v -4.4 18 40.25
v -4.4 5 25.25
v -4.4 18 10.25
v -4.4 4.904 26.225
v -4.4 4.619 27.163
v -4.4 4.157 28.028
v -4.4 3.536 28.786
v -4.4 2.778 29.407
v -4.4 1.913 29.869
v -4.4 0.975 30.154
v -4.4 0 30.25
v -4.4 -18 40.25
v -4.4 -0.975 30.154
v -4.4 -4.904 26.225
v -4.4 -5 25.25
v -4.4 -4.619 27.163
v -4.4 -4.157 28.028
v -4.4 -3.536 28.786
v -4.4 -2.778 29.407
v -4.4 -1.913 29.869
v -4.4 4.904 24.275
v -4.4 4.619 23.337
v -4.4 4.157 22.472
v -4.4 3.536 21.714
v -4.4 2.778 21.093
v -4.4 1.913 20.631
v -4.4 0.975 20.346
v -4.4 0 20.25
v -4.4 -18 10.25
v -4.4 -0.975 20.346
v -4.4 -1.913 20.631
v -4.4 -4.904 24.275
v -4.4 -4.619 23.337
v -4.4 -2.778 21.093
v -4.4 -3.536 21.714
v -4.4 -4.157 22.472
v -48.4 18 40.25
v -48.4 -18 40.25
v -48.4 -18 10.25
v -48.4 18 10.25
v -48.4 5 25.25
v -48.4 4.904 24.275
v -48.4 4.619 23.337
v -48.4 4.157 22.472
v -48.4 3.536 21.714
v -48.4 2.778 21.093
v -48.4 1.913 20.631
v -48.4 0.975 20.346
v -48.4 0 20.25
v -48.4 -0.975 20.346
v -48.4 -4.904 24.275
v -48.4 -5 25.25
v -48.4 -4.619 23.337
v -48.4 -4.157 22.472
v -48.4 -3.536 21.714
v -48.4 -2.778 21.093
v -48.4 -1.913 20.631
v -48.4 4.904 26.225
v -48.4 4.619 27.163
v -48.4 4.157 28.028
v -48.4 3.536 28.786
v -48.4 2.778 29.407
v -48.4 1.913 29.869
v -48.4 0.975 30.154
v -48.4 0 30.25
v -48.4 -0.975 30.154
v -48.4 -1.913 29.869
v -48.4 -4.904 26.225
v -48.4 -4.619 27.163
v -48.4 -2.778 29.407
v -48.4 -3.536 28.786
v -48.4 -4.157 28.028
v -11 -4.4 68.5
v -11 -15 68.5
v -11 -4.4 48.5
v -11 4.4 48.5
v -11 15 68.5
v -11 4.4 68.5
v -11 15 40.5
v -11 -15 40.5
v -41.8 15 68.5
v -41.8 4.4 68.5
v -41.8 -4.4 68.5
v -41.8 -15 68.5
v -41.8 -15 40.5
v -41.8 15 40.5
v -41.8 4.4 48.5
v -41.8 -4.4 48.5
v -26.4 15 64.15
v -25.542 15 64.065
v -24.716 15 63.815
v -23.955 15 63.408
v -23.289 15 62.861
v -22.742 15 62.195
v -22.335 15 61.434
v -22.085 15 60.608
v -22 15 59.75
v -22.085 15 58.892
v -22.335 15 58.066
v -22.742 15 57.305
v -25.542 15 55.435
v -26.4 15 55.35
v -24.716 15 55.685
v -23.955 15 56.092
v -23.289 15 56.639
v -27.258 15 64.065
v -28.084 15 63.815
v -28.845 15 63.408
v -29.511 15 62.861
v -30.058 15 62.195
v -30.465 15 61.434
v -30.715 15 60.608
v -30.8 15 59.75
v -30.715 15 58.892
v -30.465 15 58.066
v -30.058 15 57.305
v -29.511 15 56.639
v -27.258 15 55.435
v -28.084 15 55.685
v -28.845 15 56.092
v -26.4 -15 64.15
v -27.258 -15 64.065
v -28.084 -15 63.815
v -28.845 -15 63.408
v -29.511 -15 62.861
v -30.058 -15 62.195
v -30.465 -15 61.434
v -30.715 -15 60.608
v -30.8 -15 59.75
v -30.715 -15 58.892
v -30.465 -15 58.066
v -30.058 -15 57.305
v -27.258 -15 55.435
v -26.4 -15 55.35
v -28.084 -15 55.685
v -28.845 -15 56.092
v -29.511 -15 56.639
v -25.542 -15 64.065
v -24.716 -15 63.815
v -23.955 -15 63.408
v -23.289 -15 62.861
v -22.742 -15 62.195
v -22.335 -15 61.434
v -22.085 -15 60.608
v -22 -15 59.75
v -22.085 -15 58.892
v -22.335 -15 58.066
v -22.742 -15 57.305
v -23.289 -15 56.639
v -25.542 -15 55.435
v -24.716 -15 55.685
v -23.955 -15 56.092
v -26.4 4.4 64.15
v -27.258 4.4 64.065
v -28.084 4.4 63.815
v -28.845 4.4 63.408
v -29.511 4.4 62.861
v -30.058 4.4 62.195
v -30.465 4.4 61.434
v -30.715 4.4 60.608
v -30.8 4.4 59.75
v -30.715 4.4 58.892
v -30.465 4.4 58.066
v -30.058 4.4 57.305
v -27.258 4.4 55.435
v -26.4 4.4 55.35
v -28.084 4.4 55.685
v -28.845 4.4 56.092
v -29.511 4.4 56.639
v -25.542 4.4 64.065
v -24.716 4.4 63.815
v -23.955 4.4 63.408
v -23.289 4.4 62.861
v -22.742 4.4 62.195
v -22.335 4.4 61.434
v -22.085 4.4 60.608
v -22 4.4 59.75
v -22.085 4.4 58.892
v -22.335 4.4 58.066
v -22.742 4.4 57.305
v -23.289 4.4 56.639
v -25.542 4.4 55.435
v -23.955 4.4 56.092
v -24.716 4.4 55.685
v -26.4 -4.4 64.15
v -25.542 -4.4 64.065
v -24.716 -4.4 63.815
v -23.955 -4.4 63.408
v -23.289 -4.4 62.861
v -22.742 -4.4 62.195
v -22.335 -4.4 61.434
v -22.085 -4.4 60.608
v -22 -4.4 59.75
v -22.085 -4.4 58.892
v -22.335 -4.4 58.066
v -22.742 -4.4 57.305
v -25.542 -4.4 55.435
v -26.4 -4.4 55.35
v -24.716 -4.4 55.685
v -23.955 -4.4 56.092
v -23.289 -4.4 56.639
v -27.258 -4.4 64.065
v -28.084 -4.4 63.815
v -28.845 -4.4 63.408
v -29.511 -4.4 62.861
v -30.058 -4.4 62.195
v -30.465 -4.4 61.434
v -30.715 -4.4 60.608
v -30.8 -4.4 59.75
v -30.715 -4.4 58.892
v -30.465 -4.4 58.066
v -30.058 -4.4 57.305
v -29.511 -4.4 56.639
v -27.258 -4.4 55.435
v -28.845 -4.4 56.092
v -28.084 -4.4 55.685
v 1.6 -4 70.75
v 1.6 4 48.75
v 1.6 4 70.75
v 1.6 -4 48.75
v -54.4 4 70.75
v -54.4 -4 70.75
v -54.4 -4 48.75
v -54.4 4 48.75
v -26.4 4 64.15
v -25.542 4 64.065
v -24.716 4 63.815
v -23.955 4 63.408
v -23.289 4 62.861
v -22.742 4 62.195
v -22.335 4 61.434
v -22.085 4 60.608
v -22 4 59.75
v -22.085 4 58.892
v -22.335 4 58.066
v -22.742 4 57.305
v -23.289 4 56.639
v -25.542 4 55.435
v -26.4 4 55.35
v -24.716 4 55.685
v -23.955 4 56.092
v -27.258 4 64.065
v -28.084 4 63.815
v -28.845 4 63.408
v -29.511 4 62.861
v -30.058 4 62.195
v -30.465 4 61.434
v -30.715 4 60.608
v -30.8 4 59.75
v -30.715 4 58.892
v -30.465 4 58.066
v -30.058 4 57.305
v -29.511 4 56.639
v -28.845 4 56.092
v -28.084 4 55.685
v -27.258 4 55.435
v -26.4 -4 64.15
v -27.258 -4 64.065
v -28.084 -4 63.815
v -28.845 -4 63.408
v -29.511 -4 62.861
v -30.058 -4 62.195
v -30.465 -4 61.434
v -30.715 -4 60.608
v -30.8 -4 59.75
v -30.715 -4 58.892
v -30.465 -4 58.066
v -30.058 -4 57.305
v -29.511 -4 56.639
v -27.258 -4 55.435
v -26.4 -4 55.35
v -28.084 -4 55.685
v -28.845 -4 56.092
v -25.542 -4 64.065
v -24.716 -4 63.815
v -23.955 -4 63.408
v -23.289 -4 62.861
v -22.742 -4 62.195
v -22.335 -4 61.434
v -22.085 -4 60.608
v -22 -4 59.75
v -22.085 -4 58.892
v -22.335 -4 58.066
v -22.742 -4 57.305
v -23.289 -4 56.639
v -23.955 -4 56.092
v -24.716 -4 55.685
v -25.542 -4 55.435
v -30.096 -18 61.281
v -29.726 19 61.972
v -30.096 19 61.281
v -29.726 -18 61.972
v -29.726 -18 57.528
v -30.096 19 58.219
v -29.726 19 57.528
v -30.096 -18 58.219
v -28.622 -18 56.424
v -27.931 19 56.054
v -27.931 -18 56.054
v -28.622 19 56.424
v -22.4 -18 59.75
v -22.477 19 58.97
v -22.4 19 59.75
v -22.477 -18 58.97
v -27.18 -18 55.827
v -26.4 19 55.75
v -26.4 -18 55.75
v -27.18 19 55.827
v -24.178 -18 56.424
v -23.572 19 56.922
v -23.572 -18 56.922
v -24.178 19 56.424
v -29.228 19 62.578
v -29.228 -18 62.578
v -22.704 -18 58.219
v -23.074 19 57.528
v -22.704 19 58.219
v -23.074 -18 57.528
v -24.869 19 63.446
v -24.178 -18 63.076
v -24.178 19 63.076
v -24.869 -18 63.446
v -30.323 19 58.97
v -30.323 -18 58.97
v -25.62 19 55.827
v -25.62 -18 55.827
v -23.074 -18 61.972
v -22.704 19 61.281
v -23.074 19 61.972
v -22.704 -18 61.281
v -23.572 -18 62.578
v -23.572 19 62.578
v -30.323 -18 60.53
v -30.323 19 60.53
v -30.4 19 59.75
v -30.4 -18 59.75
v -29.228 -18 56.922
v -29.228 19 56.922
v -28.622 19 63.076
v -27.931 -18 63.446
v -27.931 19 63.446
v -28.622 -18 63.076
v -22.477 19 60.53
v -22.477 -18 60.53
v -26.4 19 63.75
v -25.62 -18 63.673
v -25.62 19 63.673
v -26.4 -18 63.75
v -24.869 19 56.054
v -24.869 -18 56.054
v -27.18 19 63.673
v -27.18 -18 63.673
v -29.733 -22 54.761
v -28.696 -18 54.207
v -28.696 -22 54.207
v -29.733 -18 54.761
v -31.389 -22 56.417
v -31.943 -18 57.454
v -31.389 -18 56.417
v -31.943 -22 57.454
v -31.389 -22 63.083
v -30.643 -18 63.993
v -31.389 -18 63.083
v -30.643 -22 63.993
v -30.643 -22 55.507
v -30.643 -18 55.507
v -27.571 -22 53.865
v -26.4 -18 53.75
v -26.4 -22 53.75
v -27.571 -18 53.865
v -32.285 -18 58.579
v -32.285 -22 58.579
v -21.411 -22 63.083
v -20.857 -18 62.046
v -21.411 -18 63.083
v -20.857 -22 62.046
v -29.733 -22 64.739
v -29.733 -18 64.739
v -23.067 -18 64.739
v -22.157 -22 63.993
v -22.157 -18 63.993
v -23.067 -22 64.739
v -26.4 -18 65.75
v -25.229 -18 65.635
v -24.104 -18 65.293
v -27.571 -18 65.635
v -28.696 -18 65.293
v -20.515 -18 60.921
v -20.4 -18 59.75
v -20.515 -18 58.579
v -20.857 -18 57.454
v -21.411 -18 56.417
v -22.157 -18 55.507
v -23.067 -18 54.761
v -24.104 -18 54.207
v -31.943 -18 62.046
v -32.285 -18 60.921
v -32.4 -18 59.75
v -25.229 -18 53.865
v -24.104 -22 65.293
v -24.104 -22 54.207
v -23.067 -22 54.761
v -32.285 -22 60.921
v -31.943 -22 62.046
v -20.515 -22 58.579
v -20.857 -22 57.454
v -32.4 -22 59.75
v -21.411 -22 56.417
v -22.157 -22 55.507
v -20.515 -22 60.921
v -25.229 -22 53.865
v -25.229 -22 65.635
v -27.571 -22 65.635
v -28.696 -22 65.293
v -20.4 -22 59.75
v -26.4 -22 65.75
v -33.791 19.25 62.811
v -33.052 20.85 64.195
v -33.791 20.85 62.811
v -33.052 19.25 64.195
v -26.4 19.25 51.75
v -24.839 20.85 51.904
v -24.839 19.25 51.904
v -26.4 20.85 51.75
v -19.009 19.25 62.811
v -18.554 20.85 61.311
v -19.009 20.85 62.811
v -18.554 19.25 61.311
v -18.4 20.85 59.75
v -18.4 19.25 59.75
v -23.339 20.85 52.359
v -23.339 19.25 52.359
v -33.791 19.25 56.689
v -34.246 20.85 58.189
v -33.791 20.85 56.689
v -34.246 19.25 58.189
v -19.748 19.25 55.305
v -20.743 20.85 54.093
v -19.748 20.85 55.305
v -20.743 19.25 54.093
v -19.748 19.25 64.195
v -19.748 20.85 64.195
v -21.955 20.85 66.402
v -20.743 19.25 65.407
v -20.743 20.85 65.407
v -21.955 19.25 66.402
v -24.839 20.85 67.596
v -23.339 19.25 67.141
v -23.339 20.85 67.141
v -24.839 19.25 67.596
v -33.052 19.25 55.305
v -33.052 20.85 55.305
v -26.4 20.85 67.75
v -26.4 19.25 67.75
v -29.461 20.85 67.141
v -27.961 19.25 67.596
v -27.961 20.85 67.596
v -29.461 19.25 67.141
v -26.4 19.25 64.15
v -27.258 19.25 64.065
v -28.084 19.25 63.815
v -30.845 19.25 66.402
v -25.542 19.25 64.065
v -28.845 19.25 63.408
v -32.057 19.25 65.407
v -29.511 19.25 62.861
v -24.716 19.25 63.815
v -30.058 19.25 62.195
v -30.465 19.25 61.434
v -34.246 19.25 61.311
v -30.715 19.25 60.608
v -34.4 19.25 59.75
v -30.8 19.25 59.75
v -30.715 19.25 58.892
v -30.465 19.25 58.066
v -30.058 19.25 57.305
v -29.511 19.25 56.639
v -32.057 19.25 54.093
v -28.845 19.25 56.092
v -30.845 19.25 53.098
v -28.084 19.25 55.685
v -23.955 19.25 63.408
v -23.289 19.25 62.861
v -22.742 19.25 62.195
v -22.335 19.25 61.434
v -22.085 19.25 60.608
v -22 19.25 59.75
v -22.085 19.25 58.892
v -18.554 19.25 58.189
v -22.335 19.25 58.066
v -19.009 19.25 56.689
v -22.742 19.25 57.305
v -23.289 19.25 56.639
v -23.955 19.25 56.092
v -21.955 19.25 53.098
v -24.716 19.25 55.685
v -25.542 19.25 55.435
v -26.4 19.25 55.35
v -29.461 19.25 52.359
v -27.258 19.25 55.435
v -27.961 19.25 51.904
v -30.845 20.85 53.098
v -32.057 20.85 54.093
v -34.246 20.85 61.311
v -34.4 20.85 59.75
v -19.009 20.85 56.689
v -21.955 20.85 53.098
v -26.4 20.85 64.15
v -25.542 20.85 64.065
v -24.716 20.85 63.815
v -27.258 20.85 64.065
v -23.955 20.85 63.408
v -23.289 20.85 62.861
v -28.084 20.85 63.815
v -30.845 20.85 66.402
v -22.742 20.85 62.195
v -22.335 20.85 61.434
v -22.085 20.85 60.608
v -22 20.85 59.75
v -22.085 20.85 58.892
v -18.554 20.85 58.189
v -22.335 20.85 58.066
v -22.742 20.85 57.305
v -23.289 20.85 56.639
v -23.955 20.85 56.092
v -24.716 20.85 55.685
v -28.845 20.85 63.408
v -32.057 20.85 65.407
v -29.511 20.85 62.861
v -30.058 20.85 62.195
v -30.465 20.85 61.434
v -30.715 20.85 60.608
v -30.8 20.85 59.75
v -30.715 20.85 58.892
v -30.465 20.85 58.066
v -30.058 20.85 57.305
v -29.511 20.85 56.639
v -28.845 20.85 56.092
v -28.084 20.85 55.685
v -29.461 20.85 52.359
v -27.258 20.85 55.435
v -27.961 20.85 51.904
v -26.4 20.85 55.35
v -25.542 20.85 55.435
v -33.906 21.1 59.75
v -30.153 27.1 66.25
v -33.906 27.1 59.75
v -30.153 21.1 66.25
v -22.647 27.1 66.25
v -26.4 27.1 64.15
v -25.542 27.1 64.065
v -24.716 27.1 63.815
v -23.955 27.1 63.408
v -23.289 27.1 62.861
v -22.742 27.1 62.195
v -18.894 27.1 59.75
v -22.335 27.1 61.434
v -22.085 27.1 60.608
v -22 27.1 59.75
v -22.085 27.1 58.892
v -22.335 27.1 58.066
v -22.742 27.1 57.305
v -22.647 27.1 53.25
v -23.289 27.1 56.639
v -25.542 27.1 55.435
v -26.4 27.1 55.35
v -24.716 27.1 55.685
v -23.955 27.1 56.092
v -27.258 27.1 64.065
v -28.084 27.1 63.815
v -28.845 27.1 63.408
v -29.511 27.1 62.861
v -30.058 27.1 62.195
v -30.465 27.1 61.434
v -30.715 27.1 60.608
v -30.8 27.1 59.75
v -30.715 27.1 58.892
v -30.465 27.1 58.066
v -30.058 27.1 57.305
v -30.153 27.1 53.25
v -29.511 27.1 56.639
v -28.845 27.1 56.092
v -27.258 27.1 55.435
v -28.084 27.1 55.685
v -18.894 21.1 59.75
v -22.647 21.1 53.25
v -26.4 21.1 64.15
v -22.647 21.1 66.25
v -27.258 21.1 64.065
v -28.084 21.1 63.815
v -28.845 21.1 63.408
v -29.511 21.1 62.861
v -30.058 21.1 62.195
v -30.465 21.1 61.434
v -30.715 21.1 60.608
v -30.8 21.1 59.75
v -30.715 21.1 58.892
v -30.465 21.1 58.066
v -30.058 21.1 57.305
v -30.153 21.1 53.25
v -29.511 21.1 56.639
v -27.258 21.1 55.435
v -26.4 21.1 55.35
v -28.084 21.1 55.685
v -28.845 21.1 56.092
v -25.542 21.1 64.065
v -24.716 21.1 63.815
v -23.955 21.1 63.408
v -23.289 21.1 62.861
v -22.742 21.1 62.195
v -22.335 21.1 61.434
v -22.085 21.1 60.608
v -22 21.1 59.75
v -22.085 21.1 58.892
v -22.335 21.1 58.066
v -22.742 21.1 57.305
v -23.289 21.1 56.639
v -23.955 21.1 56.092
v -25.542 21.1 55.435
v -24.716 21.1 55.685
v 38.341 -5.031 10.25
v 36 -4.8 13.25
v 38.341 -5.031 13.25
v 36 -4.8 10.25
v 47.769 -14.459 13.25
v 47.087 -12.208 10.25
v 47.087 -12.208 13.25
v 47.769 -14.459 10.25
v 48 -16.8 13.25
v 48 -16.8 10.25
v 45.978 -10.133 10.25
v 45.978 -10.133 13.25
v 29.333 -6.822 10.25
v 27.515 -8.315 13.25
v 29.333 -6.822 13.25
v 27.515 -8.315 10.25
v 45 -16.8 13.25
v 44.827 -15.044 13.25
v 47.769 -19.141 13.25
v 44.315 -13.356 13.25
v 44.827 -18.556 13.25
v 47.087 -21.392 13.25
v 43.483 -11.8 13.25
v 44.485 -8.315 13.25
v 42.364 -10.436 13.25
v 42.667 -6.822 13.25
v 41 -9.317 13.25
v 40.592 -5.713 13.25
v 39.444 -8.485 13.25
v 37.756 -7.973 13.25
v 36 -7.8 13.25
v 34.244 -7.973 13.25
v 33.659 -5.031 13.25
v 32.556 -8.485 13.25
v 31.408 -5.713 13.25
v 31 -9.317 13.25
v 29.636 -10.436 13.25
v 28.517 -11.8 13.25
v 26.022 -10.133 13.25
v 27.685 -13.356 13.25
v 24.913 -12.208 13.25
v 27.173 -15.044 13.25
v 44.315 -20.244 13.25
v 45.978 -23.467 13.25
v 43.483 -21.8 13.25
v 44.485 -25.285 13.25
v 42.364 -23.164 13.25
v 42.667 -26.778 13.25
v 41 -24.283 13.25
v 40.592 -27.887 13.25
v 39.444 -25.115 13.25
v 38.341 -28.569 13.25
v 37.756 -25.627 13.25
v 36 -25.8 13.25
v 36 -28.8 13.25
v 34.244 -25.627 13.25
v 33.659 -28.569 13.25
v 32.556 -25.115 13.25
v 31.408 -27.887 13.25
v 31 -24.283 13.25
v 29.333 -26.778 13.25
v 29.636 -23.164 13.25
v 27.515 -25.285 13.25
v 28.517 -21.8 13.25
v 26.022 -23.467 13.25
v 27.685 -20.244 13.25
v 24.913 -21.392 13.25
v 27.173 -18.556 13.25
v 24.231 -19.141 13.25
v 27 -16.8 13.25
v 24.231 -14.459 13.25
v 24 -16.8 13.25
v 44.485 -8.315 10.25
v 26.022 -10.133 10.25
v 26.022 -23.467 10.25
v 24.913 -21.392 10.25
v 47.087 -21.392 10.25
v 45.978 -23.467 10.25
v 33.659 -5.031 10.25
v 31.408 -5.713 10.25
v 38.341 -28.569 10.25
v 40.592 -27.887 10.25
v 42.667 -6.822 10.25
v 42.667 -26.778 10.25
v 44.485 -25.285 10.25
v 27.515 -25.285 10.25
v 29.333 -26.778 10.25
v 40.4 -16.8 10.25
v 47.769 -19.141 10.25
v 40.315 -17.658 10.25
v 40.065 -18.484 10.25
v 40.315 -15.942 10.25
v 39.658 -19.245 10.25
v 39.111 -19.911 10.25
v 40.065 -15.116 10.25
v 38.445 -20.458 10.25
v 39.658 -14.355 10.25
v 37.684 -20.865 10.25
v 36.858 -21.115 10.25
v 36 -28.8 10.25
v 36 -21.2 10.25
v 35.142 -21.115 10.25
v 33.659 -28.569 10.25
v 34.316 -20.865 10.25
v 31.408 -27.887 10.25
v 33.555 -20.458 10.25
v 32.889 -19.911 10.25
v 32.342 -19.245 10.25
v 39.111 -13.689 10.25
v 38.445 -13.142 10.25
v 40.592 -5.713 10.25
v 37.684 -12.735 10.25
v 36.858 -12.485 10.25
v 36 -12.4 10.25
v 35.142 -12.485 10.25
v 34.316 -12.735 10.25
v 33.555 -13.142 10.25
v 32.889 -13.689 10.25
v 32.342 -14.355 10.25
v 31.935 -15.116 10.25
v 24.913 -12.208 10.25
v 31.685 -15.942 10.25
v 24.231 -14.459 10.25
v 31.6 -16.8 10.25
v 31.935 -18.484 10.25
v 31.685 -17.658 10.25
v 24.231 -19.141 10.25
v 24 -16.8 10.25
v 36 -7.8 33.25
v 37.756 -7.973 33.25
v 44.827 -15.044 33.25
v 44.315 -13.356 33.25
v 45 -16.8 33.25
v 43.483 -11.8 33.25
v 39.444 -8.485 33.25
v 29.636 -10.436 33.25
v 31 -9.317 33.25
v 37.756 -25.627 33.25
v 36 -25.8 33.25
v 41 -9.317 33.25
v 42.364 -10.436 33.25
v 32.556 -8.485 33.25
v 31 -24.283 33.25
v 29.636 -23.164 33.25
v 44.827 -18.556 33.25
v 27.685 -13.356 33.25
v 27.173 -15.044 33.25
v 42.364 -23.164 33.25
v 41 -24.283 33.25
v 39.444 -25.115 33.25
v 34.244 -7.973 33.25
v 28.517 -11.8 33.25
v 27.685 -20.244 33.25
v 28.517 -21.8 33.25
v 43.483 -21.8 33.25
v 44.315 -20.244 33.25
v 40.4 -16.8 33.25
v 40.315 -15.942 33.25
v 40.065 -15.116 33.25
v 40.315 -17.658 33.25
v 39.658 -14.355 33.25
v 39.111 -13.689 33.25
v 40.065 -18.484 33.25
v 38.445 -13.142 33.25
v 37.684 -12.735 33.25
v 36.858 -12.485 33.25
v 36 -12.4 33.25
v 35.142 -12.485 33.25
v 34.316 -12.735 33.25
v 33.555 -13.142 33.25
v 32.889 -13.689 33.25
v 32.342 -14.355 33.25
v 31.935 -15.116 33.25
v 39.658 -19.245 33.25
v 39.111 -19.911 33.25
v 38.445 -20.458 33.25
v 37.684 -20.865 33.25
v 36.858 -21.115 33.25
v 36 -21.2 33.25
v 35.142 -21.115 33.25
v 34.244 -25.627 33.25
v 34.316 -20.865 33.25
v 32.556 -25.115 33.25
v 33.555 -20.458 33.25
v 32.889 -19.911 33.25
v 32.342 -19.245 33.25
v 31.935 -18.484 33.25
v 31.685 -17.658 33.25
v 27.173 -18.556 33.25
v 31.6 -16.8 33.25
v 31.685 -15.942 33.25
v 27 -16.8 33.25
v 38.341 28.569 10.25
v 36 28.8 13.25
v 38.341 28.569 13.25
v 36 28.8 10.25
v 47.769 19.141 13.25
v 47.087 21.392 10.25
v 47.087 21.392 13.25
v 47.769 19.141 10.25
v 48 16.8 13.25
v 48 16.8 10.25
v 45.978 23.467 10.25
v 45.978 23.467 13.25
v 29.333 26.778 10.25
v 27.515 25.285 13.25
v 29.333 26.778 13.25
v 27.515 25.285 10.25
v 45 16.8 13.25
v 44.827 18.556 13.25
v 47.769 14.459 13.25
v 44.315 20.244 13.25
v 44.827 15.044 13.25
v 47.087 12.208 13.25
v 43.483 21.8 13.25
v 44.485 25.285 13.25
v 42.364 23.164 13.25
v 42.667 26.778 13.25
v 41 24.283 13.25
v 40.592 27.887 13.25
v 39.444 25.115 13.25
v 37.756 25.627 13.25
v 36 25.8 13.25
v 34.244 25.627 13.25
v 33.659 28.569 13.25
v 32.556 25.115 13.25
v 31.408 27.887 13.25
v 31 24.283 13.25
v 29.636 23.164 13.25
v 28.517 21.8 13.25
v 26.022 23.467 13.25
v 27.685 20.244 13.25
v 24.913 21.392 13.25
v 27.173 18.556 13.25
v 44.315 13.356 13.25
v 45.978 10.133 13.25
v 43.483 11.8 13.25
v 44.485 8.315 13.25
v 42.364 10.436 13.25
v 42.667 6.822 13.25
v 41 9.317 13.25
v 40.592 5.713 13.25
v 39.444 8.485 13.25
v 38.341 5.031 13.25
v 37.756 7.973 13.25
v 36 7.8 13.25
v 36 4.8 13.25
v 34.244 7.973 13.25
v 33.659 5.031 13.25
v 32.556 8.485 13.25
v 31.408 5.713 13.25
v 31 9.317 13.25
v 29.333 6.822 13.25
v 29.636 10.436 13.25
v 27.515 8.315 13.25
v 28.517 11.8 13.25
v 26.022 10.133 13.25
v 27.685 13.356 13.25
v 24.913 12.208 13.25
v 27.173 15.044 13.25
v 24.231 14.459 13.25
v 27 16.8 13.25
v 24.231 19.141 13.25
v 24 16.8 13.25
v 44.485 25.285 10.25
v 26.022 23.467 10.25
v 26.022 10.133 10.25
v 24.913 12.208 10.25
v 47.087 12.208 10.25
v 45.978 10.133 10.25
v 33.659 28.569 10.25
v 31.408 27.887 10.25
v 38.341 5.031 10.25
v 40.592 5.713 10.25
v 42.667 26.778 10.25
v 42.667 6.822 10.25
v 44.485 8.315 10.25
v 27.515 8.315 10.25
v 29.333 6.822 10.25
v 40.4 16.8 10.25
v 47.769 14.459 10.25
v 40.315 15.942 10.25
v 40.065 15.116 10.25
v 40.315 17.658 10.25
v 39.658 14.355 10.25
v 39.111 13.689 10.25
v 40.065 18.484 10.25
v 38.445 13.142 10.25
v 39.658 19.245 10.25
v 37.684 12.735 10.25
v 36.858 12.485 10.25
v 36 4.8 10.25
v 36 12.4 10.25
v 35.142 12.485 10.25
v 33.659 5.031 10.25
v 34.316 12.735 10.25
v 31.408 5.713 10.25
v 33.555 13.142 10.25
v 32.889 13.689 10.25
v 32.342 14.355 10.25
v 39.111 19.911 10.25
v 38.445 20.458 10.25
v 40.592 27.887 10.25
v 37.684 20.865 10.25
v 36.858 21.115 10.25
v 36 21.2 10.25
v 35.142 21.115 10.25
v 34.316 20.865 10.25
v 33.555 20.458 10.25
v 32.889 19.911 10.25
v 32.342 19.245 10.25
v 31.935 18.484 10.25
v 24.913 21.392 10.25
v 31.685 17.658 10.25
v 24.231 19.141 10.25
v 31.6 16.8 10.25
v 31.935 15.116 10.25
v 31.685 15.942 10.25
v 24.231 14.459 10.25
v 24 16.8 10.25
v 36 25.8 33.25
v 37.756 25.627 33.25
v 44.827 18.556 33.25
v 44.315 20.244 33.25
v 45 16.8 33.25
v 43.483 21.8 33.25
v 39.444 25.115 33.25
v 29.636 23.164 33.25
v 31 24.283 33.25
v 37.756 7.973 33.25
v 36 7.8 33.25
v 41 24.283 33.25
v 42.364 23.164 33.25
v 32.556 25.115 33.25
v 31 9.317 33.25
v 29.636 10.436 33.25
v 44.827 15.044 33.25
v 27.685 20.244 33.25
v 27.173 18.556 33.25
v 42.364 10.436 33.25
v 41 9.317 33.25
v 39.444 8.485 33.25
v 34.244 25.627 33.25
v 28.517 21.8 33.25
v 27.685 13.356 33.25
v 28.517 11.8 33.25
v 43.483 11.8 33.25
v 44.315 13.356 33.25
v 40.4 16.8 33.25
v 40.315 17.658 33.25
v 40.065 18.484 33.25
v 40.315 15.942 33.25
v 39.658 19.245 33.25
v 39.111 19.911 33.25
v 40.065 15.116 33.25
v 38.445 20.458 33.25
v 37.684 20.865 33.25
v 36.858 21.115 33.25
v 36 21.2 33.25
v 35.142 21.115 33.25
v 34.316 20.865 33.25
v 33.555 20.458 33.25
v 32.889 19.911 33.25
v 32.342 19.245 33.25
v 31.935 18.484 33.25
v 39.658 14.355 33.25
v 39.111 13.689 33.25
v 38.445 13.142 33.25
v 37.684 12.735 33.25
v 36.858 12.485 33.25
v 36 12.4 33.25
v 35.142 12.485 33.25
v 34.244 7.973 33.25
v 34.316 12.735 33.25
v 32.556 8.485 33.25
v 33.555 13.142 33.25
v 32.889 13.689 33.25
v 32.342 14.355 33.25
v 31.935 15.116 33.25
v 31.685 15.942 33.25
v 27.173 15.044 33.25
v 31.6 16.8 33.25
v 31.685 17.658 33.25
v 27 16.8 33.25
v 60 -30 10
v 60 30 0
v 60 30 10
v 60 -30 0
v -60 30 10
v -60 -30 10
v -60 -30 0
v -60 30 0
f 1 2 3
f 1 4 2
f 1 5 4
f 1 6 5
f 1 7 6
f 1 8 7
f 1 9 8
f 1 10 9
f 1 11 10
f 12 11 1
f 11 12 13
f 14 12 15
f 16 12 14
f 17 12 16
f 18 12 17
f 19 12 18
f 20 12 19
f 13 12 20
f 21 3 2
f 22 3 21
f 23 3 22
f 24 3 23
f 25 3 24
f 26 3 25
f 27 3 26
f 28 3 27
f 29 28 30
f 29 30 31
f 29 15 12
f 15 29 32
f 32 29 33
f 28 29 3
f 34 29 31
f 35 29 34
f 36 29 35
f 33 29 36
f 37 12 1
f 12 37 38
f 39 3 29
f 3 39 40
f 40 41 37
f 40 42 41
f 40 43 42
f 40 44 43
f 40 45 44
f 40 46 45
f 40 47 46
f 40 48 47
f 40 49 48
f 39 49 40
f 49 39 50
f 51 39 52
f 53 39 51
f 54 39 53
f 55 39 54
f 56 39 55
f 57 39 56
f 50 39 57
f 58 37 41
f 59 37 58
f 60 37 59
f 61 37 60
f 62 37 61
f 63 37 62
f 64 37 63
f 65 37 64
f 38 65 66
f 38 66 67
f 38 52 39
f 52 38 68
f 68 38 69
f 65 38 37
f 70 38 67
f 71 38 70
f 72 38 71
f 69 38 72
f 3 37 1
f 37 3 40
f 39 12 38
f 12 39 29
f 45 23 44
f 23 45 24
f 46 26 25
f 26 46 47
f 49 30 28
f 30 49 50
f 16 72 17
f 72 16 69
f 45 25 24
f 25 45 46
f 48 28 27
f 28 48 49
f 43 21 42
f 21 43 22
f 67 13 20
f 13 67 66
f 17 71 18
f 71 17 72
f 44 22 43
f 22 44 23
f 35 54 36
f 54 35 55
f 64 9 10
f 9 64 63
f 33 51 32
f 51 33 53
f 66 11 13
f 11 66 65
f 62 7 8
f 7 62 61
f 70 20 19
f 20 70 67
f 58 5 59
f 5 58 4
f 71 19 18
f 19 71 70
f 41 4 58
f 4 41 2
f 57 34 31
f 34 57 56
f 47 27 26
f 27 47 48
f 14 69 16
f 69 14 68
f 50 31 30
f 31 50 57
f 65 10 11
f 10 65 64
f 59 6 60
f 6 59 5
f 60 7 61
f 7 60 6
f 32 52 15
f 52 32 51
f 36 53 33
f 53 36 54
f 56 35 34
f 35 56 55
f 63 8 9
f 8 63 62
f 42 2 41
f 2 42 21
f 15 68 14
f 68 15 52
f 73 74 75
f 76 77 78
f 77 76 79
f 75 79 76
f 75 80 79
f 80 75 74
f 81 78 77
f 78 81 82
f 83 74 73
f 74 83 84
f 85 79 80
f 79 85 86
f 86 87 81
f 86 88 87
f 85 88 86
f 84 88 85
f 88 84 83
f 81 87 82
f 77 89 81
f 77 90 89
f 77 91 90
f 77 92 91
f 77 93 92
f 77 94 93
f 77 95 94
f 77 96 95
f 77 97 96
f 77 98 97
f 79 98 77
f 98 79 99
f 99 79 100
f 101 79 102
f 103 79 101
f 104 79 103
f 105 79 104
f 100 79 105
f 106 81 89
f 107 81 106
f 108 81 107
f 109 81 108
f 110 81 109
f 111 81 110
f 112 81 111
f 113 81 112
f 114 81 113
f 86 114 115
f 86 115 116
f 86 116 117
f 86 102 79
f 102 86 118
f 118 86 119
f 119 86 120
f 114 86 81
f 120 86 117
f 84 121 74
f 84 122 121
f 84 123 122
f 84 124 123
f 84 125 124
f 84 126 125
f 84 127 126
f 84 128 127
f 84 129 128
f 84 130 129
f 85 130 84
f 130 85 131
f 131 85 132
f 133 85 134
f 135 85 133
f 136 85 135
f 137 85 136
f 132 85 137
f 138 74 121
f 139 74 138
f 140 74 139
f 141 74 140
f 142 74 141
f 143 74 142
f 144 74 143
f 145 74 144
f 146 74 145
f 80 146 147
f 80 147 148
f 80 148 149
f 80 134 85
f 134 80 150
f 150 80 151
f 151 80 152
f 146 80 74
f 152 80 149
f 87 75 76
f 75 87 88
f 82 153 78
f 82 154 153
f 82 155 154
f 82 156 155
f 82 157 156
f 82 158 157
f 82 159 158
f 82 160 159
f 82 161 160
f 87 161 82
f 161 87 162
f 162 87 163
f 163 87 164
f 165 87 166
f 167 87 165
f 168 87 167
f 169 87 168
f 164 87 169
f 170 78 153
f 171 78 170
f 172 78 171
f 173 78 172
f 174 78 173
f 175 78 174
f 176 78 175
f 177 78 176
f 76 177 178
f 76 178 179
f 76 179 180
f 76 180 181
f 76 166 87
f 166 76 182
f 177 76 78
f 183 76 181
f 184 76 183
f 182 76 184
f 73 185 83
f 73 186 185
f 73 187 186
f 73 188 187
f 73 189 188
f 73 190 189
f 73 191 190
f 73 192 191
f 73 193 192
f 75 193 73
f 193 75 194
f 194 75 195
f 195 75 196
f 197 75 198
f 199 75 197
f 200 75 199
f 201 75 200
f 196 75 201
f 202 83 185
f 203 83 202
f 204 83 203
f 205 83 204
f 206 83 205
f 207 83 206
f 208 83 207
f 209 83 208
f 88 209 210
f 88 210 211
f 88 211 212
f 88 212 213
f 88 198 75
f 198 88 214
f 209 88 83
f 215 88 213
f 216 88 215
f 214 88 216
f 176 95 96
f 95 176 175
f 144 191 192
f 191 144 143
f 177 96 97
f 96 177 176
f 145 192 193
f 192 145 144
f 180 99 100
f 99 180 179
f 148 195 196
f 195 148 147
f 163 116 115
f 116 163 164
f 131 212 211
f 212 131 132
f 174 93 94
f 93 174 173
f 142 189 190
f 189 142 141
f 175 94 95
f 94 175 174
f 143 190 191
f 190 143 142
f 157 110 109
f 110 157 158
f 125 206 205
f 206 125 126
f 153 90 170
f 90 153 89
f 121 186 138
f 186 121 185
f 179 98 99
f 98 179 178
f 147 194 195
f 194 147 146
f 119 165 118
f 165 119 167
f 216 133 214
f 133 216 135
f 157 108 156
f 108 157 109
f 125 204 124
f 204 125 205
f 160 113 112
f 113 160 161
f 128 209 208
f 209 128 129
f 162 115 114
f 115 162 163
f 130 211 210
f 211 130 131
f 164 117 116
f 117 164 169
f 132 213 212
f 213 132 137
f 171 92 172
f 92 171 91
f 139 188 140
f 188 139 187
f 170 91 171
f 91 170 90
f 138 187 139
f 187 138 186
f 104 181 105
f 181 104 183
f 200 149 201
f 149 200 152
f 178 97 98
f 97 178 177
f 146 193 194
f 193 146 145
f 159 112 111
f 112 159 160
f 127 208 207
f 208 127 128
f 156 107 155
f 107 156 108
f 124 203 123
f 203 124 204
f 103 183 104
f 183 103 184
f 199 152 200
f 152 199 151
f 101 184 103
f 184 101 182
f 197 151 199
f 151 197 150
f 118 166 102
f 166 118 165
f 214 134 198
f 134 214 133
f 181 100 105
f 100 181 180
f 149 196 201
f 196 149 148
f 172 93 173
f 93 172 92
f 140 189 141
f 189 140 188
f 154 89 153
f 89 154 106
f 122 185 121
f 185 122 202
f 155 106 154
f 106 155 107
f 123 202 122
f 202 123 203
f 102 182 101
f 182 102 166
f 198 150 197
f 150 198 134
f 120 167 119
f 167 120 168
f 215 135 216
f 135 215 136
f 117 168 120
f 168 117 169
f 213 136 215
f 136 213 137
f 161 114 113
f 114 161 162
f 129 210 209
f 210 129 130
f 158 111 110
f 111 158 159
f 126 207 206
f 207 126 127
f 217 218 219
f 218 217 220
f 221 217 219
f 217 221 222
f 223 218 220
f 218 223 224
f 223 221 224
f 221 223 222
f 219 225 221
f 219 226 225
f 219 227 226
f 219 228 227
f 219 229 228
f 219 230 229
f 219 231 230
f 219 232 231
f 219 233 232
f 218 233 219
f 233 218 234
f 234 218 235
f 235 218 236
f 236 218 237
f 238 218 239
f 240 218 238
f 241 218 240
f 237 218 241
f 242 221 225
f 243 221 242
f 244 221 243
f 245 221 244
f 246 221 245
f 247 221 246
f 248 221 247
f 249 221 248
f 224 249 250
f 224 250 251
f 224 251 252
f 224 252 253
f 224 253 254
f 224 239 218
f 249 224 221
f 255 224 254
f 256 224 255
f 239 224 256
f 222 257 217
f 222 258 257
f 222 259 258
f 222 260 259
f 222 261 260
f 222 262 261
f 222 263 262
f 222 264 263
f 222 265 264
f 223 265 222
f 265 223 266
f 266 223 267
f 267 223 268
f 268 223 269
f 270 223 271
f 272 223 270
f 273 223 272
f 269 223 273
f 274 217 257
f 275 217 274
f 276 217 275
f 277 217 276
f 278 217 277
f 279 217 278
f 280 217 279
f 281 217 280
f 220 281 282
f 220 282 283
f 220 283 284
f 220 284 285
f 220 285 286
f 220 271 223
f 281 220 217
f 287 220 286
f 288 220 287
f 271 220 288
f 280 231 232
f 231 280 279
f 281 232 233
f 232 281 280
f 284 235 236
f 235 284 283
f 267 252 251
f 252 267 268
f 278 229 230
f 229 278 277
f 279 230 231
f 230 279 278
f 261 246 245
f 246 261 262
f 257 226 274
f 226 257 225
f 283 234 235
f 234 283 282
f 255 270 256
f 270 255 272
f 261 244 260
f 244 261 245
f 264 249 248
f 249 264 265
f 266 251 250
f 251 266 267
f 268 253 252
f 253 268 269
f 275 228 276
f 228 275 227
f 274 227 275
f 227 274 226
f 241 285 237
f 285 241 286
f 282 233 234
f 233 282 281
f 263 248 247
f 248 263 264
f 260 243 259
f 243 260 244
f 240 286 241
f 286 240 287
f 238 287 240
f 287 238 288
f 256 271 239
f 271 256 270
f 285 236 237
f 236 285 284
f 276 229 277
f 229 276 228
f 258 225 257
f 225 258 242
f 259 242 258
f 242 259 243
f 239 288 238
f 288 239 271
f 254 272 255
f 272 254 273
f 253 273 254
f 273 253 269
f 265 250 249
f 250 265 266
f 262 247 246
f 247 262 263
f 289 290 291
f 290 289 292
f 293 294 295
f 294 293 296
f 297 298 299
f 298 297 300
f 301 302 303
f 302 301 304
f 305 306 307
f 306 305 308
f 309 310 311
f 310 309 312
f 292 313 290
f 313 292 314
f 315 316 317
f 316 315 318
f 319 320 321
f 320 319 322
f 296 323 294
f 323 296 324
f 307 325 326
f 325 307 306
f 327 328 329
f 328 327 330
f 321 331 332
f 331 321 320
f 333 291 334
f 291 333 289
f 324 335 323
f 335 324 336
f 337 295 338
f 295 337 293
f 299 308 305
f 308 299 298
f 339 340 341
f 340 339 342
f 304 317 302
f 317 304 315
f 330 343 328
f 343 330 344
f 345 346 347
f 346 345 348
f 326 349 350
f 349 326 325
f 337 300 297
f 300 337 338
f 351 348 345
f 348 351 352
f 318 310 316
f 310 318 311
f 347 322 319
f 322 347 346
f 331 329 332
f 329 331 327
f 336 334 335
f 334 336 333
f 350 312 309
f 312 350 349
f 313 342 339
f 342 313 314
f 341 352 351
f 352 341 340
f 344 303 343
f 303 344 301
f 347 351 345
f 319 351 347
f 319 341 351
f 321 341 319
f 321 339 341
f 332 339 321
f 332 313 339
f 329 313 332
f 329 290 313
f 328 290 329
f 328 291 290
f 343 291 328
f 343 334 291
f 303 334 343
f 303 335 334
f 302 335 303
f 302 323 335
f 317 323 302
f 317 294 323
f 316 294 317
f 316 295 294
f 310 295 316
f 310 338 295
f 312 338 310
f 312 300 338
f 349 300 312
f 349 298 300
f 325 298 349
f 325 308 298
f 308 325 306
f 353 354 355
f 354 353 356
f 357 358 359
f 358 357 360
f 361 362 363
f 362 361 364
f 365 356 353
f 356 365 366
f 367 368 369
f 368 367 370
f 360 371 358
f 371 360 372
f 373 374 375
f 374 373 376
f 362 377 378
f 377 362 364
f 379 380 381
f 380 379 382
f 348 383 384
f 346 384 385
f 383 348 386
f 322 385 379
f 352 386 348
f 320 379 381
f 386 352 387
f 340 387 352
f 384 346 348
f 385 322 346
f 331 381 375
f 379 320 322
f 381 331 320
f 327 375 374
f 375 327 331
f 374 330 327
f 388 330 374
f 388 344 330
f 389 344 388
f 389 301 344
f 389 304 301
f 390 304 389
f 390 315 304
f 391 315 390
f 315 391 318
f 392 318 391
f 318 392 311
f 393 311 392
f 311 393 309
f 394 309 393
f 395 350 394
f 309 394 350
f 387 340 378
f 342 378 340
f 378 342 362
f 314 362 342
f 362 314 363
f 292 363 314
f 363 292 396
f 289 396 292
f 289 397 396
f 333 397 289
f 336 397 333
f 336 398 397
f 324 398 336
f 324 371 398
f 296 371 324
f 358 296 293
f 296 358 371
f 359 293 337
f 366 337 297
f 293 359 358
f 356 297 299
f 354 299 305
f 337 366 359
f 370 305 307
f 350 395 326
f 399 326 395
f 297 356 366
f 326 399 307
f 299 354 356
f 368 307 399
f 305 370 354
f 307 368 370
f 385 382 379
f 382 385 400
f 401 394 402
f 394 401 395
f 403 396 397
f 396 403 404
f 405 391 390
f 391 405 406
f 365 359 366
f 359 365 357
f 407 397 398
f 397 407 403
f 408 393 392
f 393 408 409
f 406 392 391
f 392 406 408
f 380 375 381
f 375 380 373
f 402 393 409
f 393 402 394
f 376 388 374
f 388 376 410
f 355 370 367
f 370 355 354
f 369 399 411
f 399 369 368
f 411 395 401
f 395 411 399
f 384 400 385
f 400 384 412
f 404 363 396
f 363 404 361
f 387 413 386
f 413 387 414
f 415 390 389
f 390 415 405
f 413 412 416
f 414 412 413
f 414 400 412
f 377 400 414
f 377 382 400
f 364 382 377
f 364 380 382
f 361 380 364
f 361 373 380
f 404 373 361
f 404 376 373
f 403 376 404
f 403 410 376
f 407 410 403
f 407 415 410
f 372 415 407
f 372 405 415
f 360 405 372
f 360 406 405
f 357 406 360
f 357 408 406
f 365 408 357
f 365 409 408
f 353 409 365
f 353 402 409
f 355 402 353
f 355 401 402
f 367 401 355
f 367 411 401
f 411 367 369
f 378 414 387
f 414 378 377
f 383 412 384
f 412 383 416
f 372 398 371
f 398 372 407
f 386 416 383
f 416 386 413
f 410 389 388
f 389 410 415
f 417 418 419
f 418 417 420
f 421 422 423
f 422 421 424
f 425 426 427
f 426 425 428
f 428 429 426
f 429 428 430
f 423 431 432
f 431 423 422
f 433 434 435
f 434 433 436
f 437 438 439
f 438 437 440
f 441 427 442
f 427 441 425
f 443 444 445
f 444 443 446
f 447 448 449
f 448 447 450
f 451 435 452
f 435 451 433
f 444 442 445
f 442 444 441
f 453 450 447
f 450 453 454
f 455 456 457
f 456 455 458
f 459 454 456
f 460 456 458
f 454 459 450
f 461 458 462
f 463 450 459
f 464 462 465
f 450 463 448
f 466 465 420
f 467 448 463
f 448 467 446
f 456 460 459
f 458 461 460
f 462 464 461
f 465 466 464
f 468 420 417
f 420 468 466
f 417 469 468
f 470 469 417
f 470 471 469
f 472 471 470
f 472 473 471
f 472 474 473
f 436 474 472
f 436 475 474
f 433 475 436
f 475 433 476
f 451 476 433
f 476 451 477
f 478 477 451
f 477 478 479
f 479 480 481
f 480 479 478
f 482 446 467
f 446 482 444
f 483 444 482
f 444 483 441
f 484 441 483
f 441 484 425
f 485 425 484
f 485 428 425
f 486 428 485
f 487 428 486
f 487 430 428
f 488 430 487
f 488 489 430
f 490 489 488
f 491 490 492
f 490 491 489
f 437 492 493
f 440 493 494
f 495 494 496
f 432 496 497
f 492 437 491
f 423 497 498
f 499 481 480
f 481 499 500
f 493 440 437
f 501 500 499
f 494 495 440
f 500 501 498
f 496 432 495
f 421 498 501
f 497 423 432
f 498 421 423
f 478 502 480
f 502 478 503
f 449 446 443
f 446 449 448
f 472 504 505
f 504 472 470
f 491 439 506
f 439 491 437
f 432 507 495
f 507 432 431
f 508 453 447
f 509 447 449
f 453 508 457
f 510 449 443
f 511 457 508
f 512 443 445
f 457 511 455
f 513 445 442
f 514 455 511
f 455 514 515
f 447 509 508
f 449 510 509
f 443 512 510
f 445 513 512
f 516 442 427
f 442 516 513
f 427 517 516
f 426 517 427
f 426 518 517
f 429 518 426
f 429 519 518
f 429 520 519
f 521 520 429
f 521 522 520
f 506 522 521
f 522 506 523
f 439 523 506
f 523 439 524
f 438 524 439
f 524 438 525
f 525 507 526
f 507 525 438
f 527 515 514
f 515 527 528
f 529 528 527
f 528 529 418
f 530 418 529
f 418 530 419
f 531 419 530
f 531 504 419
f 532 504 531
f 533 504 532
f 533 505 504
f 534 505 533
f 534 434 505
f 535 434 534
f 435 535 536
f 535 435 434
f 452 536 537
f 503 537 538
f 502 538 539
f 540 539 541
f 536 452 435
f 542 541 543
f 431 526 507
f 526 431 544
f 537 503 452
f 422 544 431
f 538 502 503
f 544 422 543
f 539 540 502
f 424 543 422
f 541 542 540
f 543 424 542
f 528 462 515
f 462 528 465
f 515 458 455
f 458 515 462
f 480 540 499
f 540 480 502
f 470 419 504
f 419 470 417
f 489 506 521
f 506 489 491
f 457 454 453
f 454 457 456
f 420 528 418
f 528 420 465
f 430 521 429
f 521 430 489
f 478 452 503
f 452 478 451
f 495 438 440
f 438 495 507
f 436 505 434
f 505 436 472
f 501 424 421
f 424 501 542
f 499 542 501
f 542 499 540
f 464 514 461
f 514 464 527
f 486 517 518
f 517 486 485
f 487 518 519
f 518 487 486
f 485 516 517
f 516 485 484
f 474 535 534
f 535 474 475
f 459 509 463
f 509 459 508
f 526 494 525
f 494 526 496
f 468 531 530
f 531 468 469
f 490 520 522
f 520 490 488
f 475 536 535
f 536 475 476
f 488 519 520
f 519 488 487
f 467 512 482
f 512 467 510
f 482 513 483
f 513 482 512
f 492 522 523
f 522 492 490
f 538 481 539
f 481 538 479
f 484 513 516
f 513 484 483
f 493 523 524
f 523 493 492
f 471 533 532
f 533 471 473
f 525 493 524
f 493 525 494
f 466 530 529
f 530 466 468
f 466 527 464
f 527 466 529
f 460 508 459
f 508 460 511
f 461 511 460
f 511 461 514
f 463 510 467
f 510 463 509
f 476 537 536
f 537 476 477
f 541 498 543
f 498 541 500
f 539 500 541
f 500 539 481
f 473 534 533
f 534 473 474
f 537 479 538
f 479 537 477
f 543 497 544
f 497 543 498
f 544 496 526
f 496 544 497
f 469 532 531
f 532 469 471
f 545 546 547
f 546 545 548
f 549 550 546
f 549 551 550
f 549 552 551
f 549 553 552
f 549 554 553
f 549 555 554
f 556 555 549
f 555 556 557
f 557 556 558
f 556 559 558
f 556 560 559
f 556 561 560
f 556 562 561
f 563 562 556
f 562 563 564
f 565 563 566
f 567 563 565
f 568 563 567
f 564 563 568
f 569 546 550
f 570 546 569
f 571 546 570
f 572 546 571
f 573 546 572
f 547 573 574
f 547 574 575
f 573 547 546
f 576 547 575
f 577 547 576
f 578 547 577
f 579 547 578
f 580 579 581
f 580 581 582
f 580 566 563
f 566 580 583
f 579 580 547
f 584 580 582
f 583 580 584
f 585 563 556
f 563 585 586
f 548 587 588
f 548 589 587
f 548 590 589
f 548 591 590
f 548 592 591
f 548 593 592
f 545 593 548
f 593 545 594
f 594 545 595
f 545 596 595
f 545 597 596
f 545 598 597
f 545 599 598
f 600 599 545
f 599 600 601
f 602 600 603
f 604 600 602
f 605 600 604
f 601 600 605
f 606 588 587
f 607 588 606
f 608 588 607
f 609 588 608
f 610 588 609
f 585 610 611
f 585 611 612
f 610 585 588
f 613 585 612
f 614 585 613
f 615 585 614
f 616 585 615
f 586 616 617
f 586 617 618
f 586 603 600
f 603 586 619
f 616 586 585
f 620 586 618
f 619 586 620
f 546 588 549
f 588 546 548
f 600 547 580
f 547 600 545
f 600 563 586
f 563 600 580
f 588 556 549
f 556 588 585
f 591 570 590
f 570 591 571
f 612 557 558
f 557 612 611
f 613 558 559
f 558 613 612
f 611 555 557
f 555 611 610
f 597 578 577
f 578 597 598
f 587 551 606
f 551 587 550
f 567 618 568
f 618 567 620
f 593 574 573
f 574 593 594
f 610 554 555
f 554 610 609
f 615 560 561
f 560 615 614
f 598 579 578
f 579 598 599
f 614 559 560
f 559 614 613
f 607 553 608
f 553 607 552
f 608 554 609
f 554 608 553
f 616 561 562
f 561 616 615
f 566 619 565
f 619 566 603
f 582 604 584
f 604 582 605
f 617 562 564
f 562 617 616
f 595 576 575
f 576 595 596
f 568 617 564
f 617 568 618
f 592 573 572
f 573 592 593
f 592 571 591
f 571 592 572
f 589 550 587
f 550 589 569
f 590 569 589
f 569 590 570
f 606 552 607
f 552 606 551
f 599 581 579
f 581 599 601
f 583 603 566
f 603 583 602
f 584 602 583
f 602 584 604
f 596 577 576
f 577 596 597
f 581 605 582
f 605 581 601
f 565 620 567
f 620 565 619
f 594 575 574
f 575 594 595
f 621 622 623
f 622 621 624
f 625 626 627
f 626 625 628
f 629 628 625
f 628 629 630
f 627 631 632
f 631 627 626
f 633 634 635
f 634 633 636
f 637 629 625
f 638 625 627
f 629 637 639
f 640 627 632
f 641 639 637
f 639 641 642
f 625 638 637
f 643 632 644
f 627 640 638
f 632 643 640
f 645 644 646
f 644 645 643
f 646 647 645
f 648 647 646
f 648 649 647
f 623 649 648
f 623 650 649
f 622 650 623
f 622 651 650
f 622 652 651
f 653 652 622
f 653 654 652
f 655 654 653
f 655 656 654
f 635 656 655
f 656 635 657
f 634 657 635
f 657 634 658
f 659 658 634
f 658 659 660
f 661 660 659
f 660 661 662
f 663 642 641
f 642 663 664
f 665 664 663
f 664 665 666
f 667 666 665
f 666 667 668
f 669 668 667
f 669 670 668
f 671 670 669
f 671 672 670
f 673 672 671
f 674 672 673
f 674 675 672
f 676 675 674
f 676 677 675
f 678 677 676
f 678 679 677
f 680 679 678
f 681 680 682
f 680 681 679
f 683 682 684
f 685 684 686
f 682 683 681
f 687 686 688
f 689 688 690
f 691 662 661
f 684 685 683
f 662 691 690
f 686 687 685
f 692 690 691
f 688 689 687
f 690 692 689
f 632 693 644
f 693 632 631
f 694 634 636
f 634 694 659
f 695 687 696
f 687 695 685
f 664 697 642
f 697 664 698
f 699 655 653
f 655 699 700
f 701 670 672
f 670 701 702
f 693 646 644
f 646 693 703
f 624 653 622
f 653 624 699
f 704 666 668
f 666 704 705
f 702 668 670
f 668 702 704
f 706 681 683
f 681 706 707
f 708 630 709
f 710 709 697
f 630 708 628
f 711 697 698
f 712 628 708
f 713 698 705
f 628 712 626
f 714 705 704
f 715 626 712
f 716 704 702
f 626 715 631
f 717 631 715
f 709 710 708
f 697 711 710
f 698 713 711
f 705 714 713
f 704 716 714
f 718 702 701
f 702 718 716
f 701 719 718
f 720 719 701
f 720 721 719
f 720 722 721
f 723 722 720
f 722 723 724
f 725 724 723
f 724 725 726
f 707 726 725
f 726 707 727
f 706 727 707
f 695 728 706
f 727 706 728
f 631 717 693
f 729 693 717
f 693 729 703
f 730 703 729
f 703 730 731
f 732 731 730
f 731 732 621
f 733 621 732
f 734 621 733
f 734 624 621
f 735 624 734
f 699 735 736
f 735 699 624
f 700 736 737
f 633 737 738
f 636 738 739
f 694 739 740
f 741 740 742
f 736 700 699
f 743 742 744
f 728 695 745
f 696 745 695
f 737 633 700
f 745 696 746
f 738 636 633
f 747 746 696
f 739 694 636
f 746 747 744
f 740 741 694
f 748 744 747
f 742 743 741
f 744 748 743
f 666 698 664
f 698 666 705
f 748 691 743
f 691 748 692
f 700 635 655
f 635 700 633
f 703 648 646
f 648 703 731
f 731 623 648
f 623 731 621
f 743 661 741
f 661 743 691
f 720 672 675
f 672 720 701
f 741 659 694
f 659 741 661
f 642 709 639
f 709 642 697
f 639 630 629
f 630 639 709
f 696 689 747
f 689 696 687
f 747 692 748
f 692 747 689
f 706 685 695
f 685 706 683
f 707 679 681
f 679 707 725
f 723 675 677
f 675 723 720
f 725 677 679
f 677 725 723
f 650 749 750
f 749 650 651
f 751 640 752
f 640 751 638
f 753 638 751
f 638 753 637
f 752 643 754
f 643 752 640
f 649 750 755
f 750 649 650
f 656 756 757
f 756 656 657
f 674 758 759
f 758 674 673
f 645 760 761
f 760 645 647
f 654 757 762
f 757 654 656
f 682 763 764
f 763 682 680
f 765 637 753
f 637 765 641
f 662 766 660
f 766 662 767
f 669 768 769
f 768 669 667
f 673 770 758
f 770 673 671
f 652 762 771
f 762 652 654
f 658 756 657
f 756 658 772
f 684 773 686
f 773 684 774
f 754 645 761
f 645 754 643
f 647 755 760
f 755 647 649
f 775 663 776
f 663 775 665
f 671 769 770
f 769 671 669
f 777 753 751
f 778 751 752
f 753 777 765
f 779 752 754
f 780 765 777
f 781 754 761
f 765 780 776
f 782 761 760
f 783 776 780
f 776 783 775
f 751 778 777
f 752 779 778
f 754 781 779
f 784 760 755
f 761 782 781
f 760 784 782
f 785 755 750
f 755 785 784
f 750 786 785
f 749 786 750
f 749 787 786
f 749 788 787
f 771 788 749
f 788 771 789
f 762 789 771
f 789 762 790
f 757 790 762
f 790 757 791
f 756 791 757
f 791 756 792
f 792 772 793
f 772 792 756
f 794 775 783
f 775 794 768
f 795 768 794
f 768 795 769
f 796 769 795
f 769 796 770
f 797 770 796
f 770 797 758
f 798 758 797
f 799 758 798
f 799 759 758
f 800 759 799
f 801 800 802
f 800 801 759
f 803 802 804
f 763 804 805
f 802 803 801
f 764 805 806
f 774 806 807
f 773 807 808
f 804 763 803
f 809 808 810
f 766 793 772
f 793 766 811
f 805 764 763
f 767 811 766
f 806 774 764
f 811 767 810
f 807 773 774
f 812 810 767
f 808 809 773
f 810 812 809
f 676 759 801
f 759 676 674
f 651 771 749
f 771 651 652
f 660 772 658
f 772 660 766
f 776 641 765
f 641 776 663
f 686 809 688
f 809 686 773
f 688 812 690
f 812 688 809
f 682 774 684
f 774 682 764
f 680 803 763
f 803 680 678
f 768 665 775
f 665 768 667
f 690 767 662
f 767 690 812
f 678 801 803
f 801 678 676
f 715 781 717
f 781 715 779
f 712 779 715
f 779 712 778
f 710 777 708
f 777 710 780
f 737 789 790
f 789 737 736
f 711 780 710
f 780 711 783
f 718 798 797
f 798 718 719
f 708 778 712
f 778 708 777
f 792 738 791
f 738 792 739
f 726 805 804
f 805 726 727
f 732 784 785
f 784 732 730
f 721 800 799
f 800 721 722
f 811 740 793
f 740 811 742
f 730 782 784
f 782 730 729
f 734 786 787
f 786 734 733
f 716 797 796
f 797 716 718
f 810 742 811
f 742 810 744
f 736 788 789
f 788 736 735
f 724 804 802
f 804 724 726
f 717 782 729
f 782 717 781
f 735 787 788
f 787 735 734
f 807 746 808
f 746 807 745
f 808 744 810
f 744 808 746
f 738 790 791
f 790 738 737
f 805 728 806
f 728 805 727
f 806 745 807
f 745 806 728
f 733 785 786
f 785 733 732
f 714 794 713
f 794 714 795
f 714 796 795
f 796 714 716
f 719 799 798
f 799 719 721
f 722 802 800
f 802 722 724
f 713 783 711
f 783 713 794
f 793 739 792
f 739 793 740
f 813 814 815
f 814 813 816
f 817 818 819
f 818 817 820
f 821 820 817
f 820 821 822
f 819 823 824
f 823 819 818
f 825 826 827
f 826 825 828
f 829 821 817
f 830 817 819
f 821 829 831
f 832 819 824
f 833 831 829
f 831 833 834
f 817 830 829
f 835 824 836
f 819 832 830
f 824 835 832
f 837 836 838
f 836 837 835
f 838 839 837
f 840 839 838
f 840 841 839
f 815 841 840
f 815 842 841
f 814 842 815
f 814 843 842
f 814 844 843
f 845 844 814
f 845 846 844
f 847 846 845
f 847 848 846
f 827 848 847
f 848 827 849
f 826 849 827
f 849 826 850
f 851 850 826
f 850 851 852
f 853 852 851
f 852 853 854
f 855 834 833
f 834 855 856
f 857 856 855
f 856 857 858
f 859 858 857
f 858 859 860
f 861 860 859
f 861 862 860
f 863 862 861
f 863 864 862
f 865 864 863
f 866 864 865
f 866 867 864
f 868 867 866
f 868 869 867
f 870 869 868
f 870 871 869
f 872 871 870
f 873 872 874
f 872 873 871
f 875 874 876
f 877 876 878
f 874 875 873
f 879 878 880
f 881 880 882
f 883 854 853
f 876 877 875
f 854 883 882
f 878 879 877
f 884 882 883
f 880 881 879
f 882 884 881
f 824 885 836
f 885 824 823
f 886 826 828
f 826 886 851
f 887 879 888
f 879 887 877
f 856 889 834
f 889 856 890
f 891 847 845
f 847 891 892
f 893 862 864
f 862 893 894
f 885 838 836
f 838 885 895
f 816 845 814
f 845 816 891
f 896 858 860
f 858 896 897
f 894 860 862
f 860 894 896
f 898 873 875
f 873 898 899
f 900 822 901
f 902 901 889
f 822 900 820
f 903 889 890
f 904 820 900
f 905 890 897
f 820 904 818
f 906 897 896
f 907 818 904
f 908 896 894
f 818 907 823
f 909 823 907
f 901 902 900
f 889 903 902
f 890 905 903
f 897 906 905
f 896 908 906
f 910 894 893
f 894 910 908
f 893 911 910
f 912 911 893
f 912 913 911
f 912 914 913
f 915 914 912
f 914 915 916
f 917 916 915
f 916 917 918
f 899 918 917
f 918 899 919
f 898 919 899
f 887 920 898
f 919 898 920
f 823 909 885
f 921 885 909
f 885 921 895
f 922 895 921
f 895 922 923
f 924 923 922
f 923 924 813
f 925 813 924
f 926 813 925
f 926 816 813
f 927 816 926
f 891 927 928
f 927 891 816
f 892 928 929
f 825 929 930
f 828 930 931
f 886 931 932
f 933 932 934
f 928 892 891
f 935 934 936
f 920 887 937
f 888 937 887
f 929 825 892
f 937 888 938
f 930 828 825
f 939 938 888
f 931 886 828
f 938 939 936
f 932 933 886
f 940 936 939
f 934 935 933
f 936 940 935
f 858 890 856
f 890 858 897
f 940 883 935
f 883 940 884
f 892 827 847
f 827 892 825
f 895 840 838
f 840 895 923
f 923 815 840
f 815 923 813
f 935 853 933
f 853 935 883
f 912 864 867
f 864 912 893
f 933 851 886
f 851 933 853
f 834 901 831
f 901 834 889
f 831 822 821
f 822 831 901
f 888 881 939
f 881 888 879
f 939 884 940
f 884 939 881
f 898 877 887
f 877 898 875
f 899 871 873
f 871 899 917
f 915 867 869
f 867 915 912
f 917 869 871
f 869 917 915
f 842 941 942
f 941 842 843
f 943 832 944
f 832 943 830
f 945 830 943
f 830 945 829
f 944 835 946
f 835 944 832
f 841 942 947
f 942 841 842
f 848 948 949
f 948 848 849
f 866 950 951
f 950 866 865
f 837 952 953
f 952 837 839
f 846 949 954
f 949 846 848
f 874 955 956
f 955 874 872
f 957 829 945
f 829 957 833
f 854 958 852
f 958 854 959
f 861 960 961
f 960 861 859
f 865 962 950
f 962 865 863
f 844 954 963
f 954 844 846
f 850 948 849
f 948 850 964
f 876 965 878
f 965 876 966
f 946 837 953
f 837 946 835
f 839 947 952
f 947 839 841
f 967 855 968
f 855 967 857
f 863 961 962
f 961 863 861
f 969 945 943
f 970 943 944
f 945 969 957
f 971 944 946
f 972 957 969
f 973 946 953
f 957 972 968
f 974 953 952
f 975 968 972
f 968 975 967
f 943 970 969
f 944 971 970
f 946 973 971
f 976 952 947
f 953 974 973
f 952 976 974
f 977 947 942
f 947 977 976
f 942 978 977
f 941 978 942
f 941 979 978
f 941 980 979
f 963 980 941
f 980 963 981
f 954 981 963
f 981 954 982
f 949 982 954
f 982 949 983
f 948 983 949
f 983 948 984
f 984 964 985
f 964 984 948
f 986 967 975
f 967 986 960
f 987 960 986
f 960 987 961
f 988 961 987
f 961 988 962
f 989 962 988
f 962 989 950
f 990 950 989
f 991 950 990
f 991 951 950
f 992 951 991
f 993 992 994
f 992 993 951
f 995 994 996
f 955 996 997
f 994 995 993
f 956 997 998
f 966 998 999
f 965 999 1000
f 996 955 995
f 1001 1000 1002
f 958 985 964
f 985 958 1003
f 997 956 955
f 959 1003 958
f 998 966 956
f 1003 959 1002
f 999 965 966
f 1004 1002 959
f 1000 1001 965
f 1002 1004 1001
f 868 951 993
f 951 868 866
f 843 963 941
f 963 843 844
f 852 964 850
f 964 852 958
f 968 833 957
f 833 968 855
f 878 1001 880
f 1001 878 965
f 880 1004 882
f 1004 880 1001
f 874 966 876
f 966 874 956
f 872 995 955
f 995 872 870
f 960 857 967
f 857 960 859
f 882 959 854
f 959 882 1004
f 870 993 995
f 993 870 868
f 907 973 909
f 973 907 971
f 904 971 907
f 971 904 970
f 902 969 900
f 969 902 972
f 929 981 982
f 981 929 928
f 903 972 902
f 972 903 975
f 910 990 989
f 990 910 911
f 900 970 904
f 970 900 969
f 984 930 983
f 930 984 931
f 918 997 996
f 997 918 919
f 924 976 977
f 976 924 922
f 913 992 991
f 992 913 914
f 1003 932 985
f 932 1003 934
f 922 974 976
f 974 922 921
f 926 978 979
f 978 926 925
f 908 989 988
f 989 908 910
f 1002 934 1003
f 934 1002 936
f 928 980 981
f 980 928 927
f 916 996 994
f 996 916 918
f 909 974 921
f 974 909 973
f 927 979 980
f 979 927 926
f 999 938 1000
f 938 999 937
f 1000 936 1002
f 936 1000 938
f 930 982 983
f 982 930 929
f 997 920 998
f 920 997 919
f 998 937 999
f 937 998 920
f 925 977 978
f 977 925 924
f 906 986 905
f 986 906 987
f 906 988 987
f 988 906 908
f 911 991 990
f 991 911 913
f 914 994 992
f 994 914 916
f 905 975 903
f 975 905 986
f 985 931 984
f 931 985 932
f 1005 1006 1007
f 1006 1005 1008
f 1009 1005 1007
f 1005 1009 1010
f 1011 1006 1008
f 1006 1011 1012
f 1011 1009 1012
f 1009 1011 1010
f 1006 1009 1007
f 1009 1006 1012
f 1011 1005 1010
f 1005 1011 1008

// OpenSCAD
$fn = 32;

// ------------------------------------------------------------------------
// Indexing jig: plate 120 x 60 mm, pin d8
// Every part is its own module, assembly() places every instance.
// ------------------------------------------------------------------------

// --- part 1 ---
module jig_plate() {
  difference() {
    translate([-60, -30, 0]) cube([120, 60, 10]);
  }
}

// --- part 2 ---
module locator_block() {
  difference() {
    translate([-22, -18, 0]) cube([44, 36, 30]);
    translate([0, 0, 15]) rotate([0, 90, 0]) cylinder(h = 46, d = 10, center = true);
  }
}

// --- part 3 ---
module index_fork() {
  difference() {
    translate([-15.4, -15, 0]) cube([30.8, 30, 28]);
    translate([-16.4, -4.4, 8]) cube([32.8, 8.8, 21]);
    translate([0, 0, 19.25]) rotate([90, 0, 0]) cylinder(h = 32, d = 8.8, center = true);
  }
}

// --- part 4 ---
module index_arm() {
  difference() {
    translate([-28, -4, 0]) cube([56, 8, 22]);
    translate([0, 0, 11]) rotate([90, 0, 0]) cylinder(h = 10, d = 8.8, center = true);
  }
}

// --- part 5 ---
module index_pin() {
  rotate([0, 90, 0]) cylinder(h = 38, d = 8, center = true);
  translate([-22, 0, 0]) rotate([0, 90, 0]) cylinder(h = 4, d = 12);
}

// --- part 6 ---
module pin_washer() {
  difference() {
      translate([0, 0, 0]) cylinder(h = 1.6, d = 16);
      translate([0, 0, -1]) cylinder(h = 3.6, d = 8.8);
    }
}

// --- part 7 ---
module lock_nut() {
  difference() {
    linear_extrude(height = 6) polygon(points = [[7.506, 0], [3.753, 6.5], [-3.753, 6.5], [-7.506, 0], [-3.753, -6.5], [3.753, -6.5]]);
    translate([0, 0, -1]) cylinder(h = 8, d = 8.8);
  }
}

// --- part 8 ---
module guide_bush_a() {
  difference() {
    union() {
      cylinder(h = 3, d = 24);
      translate([0, 0, 3]) cylinder(h = 20, d = 18);
    }
    translate([0, 0, -1]) cylinder(h = 25, d = 8.8);
  }
}

// --- part 9 ---
module guide_bush_b() {
  difference() {
    union() {
      cylinder(h = 3, d = 24);
      translate([0, 0, 3]) cylinder(h = 20, d = 18);
    }
    translate([0, 0, -1]) cylinder(h = 25, d = 8.8);
  }
}

// --- assembly ---
module assembly() {
  color([0.80, 0.24, 0.20]) translate([0, 0, 0]) rotate([0, 0, 0]) jig_plate();
  color([0.20, 0.45, 0.75]) translate([-26.4, 0, 10.25]) rotate([0, 0, 0]) locator_block();
  color([0.25, 0.62, 0.32]) translate([-26.4, 0, 40.5]) rotate([0, 0, 0]) index_fork();
  color([0.92, 0.70, 0.18]) translate([-26.4, 0, 48.75]) rotate([0, 0, 0]) index_arm();
  color([0.58, 0.35, 0.70]) translate([-26.4, 0, 59.75]) rotate([0, 0, 90]) index_pin();
  color([0.16, 0.66, 0.66]) translate([-26.4, 20.85, 59.75]) rotate([90, 0, 0]) pin_washer();
  color([0.85, 0.48, 0.18]) translate([-26.4, 27.1, 59.75]) rotate([90, 0, 0]) lock_nut();
  color([0.55, 0.60, 0.65]) translate([36, -16.8, 10.25]) rotate([0, 0, 0]) guide_bush_a();
  color([0.75, 0.30, 0.55]) translate([36, 16.8, 10.25]) rotate([0, 0, 0]) guide_bush_b();
}

assembly();
